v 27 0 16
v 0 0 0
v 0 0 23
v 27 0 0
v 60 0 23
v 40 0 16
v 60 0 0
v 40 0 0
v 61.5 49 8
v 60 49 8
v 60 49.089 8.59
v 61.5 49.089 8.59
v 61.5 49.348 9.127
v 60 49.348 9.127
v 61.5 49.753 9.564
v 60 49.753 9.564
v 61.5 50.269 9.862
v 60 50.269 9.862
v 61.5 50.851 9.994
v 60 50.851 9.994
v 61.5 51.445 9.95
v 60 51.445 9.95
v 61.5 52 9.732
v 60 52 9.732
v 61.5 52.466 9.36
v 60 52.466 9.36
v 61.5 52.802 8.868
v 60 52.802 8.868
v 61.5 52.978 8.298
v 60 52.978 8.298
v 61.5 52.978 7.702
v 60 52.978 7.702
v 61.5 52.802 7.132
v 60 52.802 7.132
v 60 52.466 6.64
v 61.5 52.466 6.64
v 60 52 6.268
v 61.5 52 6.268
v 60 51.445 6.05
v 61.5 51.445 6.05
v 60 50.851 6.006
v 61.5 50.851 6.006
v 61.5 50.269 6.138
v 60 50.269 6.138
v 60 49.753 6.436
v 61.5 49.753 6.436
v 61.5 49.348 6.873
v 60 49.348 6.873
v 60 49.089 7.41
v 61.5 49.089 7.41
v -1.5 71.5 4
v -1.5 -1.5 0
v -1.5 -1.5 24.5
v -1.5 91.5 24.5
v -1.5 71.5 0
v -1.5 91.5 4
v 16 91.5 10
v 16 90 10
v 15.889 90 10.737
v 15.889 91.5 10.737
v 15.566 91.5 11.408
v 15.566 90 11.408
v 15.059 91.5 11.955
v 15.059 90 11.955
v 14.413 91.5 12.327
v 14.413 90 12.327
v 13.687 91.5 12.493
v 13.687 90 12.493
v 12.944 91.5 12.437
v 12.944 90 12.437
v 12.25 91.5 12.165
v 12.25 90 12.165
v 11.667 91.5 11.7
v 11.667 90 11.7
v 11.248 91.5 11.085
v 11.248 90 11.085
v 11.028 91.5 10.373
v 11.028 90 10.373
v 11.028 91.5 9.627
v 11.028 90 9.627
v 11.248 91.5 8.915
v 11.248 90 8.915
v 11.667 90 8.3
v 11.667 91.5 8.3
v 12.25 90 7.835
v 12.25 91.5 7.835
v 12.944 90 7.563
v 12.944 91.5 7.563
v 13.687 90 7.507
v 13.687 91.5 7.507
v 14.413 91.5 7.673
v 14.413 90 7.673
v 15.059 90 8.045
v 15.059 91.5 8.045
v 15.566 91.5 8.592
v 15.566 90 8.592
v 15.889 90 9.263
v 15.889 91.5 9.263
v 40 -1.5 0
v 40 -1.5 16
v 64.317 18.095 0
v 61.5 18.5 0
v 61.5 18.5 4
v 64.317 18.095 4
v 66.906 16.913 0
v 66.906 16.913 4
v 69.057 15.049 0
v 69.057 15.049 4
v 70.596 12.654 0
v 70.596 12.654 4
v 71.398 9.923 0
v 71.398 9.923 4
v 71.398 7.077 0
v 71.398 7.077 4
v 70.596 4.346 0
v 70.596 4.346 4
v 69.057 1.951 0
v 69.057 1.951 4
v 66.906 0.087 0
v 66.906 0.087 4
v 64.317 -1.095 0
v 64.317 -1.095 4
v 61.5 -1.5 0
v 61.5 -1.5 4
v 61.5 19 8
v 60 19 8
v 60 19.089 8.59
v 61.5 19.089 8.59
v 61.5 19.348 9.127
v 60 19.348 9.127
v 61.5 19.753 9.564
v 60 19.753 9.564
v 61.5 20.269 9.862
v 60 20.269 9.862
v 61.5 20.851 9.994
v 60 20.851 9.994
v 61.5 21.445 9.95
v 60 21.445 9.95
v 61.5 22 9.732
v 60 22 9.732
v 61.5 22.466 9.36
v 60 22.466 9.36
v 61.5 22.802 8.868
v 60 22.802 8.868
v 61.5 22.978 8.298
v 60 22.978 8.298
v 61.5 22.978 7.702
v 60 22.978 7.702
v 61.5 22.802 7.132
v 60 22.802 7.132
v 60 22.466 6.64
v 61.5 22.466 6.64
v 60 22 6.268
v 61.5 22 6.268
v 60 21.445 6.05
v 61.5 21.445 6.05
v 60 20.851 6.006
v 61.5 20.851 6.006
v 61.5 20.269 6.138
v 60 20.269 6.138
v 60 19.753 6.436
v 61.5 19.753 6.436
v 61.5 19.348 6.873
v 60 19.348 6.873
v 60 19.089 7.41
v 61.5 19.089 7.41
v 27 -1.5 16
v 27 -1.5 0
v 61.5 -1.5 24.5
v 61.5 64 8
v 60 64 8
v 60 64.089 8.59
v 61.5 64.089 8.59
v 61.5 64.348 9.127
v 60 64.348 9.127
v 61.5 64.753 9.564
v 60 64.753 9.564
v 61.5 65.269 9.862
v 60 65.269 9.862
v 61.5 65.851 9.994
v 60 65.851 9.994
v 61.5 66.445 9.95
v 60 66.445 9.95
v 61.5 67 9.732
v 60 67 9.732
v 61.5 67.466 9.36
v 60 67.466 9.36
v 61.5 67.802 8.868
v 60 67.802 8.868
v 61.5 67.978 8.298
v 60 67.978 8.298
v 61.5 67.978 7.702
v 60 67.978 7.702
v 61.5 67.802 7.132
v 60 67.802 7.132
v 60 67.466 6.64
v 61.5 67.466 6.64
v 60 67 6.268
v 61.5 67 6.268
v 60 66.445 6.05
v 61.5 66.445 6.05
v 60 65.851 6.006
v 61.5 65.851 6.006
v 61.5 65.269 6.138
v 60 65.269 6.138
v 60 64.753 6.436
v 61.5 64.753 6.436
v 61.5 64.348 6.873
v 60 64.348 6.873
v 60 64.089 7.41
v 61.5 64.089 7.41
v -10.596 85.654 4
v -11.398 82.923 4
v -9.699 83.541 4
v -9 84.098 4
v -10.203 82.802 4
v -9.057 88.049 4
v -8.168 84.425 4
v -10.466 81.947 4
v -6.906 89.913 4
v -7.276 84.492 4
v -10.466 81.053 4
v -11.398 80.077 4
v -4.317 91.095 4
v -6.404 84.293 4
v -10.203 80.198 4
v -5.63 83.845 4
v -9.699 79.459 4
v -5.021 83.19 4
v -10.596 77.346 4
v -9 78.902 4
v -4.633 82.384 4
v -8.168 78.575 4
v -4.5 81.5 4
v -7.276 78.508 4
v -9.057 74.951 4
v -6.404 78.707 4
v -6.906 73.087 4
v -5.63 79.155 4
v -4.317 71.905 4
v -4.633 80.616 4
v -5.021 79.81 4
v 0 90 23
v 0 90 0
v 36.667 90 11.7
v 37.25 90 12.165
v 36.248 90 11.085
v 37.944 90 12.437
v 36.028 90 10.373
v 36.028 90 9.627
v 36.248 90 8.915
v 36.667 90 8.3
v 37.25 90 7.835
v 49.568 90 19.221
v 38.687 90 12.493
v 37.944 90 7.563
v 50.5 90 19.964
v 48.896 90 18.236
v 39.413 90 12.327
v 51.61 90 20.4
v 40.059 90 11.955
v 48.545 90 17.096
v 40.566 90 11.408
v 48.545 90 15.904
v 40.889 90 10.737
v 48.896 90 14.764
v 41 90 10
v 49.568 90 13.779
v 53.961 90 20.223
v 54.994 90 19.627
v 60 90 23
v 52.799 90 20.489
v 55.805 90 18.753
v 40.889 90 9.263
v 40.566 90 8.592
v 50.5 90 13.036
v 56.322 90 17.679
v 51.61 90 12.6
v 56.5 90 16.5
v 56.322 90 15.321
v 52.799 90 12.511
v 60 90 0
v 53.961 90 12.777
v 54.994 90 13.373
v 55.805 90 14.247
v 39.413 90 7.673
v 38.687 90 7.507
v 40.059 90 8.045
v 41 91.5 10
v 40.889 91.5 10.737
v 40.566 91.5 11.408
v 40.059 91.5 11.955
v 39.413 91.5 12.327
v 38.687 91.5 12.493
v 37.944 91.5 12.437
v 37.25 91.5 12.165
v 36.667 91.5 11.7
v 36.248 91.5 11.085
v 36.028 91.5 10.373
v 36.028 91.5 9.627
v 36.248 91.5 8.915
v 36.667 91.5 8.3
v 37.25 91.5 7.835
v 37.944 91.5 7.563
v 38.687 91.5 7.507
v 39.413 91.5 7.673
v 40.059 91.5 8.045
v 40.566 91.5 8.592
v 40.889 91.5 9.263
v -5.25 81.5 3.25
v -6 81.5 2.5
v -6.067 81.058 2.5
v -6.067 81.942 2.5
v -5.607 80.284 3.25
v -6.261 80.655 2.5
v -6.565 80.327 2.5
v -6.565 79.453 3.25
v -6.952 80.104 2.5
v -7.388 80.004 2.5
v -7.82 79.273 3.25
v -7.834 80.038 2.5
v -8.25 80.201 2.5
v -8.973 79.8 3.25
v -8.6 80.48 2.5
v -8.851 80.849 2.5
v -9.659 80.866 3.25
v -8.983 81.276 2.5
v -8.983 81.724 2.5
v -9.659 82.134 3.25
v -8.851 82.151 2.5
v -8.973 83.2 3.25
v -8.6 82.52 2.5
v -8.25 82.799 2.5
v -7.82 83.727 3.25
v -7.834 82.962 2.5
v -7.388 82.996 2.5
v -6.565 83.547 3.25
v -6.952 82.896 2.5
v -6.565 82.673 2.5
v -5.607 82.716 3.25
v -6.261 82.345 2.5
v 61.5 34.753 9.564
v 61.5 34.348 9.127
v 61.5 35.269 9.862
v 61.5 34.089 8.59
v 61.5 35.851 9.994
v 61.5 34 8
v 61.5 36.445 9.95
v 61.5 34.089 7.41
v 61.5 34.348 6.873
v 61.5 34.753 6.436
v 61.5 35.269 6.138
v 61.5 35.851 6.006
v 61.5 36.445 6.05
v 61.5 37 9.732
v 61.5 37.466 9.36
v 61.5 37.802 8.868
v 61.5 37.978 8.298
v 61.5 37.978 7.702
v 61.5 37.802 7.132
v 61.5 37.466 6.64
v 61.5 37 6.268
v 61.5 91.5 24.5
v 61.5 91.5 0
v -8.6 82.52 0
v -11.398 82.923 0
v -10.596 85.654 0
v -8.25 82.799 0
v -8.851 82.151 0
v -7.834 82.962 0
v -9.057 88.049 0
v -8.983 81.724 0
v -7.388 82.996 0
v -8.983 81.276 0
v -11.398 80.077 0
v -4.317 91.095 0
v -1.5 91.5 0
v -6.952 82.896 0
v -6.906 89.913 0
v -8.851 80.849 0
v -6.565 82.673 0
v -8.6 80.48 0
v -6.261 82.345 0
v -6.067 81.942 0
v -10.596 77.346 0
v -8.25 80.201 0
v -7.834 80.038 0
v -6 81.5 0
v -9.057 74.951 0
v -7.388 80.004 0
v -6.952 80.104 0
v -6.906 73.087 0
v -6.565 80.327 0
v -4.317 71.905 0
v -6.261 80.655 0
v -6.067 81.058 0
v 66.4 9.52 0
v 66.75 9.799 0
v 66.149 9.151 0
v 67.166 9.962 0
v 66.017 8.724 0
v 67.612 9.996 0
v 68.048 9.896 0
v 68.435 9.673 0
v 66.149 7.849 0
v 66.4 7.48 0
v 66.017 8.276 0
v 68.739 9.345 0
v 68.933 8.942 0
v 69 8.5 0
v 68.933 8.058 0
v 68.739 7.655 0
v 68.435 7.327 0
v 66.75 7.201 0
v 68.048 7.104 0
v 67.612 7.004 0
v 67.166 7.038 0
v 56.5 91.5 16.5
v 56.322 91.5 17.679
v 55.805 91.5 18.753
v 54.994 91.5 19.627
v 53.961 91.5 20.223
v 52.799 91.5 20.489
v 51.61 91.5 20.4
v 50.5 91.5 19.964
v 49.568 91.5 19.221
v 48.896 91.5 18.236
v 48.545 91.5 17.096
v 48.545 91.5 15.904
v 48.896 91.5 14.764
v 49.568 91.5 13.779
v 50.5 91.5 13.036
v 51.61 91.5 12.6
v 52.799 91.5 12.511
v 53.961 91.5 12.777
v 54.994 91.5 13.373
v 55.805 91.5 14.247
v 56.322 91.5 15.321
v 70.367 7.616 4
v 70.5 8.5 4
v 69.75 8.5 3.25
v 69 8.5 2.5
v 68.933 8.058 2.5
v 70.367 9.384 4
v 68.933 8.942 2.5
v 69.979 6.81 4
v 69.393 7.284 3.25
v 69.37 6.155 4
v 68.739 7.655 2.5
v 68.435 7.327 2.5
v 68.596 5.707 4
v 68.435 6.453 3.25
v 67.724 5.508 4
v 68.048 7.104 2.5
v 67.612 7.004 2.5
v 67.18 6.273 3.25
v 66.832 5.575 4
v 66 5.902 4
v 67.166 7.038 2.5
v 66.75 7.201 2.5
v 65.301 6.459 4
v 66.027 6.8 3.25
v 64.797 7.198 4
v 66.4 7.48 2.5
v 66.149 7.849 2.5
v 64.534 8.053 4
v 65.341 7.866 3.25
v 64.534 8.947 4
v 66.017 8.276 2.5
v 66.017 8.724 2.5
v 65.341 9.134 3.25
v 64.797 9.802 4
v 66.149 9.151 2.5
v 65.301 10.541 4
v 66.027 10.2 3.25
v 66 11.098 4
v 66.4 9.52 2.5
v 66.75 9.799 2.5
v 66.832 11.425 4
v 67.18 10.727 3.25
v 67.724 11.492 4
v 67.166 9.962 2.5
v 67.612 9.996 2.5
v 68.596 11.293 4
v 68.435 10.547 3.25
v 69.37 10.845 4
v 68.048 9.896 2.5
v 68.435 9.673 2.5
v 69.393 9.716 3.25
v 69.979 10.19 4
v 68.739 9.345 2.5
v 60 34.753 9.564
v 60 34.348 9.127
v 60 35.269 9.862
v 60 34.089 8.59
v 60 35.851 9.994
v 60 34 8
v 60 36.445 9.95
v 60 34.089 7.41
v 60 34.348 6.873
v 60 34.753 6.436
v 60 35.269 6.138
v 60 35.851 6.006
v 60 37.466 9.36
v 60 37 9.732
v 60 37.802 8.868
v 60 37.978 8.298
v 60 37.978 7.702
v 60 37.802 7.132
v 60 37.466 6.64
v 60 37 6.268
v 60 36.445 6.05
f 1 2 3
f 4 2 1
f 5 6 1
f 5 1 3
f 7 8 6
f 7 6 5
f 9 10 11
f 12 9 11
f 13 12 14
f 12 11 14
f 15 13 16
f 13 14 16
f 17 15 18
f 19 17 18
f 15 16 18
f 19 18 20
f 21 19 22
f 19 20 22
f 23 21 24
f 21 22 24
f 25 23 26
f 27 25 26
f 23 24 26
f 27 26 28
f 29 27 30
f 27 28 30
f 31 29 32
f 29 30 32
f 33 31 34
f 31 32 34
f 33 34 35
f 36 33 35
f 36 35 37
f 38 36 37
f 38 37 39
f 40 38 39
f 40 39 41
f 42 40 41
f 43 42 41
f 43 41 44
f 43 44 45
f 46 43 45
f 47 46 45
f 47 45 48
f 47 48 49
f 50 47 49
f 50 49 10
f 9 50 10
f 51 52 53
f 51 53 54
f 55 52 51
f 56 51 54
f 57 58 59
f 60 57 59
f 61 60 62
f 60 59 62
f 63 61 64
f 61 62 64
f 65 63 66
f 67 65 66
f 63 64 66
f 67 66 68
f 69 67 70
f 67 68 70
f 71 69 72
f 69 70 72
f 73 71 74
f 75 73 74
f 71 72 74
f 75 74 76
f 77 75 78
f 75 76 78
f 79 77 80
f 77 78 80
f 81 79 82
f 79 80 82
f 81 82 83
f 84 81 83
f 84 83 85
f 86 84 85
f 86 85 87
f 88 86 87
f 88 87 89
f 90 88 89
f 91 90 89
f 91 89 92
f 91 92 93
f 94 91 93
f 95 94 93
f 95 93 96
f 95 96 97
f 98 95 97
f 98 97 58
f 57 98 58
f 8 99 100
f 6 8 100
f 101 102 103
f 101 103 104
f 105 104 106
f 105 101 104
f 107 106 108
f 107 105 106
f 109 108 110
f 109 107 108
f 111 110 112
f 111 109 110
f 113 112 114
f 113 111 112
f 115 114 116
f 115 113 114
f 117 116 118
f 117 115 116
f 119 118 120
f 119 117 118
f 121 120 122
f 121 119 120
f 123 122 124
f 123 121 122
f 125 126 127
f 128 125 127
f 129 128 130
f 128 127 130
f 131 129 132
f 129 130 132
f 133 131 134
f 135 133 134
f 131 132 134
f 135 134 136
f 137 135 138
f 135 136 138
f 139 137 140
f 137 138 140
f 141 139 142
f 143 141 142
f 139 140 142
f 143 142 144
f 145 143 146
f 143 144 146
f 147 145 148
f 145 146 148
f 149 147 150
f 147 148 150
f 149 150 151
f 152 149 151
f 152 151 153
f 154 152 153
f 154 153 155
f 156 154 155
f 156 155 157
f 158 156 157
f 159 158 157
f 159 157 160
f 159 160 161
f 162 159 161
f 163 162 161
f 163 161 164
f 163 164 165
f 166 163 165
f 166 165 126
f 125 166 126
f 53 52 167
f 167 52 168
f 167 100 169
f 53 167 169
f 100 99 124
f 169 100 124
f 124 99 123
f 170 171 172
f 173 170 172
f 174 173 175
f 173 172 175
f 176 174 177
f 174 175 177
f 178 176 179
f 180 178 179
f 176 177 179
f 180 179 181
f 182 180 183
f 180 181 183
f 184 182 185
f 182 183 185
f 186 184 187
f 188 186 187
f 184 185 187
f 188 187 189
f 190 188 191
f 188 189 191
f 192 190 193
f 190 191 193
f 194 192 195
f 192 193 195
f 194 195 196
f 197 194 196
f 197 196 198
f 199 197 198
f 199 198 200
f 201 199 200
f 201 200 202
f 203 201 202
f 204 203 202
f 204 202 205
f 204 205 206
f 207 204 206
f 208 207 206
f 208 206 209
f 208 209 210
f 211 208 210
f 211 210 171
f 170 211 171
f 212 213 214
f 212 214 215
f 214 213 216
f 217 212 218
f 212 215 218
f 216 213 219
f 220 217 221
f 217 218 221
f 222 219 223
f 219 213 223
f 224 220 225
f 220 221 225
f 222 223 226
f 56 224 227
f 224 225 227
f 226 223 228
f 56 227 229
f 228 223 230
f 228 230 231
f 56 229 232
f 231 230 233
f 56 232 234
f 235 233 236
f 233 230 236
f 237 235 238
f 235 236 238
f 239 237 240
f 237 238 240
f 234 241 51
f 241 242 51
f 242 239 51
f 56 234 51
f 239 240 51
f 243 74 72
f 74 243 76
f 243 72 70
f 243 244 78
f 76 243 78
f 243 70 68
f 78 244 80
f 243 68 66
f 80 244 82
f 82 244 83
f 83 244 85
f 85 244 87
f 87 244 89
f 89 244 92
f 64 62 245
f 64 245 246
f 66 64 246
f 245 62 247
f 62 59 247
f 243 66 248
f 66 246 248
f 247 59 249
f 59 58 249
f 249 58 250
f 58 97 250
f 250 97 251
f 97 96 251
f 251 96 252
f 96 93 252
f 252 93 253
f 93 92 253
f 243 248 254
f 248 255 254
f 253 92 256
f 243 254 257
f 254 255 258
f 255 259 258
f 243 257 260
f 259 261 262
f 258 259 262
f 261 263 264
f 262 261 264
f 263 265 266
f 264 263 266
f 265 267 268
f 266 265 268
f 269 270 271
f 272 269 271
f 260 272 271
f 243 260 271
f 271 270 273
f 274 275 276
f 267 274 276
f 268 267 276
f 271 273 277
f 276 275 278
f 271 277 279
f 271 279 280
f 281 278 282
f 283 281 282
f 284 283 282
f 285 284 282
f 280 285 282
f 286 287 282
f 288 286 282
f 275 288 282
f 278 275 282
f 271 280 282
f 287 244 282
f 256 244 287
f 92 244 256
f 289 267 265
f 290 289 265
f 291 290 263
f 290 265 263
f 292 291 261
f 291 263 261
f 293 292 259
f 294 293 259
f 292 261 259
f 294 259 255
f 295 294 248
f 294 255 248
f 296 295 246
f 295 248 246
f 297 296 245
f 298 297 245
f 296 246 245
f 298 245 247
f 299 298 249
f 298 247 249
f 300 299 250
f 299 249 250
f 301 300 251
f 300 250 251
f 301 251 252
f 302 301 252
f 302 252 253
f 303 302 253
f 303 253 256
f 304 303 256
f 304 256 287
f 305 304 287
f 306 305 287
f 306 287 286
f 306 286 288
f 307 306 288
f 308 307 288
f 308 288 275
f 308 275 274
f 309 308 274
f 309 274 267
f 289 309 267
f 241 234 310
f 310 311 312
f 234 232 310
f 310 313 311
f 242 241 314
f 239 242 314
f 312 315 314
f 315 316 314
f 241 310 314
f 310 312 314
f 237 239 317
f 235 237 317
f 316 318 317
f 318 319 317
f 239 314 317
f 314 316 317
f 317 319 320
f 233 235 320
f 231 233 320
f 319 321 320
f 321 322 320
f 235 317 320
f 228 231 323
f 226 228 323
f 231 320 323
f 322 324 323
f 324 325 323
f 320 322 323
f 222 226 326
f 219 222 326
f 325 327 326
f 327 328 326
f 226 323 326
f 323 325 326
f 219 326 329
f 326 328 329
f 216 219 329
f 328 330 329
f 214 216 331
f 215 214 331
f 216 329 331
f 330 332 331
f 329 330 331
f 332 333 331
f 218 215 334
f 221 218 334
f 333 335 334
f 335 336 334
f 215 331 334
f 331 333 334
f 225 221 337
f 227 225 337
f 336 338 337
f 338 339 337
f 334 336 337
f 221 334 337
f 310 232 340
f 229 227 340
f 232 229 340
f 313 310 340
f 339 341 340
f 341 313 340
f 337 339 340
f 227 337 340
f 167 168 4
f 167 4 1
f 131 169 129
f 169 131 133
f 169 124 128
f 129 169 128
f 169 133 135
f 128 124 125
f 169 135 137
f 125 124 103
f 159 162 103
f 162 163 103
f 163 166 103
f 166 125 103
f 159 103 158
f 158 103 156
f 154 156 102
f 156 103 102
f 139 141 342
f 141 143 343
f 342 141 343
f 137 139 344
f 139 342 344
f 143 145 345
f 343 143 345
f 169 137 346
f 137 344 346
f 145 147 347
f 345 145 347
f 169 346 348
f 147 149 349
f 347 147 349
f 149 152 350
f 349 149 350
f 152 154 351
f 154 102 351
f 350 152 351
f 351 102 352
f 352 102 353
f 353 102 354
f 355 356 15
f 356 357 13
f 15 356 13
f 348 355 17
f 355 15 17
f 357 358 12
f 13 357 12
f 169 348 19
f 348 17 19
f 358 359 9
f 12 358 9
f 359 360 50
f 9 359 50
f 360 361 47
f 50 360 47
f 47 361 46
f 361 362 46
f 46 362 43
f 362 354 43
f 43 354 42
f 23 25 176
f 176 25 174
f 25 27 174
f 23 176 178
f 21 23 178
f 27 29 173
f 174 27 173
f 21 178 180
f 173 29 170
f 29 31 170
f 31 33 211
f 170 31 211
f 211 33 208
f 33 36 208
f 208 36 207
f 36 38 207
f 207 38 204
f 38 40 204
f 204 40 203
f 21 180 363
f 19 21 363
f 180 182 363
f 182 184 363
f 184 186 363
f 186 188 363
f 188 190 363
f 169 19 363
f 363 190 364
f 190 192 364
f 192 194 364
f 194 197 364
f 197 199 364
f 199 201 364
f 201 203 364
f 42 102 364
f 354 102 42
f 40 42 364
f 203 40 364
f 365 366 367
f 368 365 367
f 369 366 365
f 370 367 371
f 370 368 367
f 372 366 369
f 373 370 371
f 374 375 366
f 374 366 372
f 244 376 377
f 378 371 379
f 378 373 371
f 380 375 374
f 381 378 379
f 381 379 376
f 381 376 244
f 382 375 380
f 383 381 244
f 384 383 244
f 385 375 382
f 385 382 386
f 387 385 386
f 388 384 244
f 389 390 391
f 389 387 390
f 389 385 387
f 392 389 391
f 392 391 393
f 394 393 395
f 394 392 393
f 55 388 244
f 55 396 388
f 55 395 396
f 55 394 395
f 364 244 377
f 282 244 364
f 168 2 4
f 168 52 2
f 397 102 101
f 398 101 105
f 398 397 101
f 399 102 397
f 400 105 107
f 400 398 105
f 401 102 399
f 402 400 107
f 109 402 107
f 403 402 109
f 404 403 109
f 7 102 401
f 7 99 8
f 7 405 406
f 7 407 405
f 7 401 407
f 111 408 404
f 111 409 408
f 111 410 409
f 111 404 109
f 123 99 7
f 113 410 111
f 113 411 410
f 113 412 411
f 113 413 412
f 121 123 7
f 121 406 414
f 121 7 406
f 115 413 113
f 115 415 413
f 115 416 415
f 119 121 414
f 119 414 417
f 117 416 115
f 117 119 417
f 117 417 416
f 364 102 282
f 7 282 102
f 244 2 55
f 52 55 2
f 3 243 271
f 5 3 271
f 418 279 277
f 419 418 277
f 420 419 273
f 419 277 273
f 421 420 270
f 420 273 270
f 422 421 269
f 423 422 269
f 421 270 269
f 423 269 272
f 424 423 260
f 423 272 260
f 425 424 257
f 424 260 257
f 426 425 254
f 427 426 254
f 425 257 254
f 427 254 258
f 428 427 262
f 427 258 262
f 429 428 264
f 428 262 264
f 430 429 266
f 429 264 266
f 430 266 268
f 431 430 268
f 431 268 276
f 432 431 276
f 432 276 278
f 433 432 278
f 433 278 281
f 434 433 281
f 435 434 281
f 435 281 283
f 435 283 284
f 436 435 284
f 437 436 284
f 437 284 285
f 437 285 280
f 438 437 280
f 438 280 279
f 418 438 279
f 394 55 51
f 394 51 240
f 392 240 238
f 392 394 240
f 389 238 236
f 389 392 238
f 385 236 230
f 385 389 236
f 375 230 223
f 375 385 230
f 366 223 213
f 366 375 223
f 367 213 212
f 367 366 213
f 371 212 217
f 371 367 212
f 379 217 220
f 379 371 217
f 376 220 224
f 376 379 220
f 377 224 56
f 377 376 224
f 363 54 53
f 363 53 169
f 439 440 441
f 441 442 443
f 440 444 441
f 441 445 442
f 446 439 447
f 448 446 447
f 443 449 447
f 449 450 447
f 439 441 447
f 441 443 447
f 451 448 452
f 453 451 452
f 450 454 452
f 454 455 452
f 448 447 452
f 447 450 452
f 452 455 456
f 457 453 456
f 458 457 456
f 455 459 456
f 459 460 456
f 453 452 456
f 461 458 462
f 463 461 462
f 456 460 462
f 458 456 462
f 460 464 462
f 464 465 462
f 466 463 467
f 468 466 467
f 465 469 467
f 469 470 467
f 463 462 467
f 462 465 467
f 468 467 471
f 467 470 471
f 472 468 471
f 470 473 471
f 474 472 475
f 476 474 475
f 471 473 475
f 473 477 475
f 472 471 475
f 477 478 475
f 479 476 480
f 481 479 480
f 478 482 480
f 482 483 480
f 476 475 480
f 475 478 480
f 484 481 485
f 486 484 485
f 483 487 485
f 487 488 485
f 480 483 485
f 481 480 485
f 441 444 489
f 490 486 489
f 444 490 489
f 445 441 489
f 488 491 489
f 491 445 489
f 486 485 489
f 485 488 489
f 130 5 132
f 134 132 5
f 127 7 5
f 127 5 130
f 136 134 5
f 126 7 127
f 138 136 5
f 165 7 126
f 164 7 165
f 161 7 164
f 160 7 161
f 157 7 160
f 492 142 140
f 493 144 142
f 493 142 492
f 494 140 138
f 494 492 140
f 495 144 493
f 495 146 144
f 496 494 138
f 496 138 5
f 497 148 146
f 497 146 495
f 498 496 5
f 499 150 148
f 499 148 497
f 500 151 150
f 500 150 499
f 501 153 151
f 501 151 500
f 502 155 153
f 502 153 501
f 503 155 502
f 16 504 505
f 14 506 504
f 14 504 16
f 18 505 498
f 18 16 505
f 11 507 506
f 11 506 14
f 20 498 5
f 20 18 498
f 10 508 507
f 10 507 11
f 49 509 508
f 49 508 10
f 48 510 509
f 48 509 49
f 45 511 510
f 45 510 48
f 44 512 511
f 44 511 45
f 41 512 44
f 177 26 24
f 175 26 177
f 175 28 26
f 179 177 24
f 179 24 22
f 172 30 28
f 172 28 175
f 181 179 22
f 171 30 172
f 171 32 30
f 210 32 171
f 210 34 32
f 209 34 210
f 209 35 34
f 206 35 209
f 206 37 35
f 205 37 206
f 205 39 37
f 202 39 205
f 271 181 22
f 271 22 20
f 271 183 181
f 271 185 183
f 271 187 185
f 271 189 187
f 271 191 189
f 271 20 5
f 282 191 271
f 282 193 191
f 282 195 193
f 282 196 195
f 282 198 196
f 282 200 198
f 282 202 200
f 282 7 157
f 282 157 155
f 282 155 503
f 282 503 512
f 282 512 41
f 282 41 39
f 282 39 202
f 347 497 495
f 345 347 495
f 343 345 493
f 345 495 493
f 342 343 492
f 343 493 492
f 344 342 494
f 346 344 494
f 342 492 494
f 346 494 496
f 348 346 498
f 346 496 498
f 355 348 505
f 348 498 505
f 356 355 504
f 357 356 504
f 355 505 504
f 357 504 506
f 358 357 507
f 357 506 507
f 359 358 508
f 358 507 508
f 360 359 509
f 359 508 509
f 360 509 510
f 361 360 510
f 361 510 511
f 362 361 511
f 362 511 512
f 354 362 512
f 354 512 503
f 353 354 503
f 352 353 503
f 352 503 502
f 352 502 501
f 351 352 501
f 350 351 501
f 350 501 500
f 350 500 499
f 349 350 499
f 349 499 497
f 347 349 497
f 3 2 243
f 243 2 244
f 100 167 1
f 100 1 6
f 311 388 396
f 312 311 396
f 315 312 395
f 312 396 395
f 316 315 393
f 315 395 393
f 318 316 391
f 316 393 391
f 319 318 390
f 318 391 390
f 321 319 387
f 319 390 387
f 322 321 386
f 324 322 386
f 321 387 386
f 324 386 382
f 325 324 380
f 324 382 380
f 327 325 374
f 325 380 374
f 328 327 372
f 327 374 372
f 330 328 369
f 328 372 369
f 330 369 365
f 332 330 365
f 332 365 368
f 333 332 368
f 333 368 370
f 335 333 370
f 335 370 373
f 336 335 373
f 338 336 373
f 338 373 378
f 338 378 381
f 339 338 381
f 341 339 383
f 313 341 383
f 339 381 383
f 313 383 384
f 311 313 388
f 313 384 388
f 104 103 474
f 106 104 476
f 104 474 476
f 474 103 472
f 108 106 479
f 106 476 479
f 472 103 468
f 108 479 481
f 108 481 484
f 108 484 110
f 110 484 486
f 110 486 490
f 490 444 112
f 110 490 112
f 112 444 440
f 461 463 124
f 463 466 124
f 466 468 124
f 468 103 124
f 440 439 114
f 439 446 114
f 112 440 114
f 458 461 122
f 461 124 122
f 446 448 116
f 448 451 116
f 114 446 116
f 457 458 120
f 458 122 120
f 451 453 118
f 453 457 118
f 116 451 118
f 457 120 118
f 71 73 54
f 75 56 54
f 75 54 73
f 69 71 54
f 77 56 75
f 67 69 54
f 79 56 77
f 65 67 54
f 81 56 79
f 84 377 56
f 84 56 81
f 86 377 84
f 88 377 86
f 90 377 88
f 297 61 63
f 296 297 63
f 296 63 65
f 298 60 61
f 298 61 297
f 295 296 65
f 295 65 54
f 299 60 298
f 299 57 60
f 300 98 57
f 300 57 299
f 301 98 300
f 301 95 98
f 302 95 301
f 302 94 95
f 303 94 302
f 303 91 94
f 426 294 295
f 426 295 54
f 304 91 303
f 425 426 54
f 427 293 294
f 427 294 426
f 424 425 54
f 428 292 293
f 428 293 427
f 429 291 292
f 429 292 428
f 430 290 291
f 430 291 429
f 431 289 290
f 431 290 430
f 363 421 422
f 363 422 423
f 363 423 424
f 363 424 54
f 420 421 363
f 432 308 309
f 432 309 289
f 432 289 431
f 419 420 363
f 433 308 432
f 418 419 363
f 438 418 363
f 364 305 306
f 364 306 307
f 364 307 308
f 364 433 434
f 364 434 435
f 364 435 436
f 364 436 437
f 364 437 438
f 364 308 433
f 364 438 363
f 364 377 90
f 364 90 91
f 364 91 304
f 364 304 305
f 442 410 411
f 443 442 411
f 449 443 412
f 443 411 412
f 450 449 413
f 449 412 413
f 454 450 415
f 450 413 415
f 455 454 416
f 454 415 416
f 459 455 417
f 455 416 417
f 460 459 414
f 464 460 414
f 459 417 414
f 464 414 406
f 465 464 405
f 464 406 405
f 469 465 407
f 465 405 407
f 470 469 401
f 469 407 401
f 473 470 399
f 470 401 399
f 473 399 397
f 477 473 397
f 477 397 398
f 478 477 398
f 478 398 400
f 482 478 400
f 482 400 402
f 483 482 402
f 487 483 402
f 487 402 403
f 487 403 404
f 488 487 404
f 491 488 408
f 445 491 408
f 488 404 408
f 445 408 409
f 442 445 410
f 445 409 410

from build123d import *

# Parameters (mm, degrees)
F0_W      = 63
F0_H      = 93
F0_W_2    = 60
F0_H_2    = 90
F1_DEPTH  = 23
F2_W      = 13
F2_H      = 16
F3_DEPTH  = 25
F5_D      = 4
F5_DEPTH  = 12
F5_TIP    = 1.2017212381
F7_D      = 5
F7_DEPTH  = 12
F7_TIP    = 1.5021515476
F9_D      = 8
F9_DEPTH  = 12
F9_TIP    = 2.4034424761
F10_W     = 63
F10_H     = 93
F11_DEPTH = 1.5
F12_R     = 1.5
F13_DEPTH = 4
F14_SIZE  = 1.5


# Not quite as in the source:
# - a feature names something its author has since deleted; it is built from what else it names


with BuildPart() as f1:
    # F0 (on Top) → F1 (new body)
    with BuildSketch(Plane.XY):
        with Locations((30, 45)):
            Rectangle(F0_W, F0_H)
        with Locations((30, 45)):
            Rectangle(F0_W_2, F0_H_2, mode=Mode.SUBTRACT)
    extrude(amount=F1_DEPTH)

    # F2 (on face) → F3 (cut)
    with BuildSketch(Plane.XZ.offset(1.5)):
        with Locations((33.5, 8)):
            Rectangle(F2_W, F2_H)
    extrude(amount=-F3_DEPTH, mode=Mode.SUBTRACT)

    # F5
    with Locations(Plane.YZ.offset(61.5)):
        with Locations((51, 8), (66, 8), (36, 8), (21, 8)):
            Hole(F5_D / 2, depth=F5_DEPTH)
            with Locations((0, 0, -(F5_DEPTH + F5_TIP / 2))):  # 118° drill point
                Cone(0, F5_D / 2, F5_TIP, mode=Mode.SUBTRACT)

    # F7 (one way)
    with BuildSketch(Plane.XZ.offset(-90)):
        with Locations((13.5, 10), (38.5, 10)):
            Circle(F7_D / 2)
    extrude(amount=-F7_DEPTH, mode=Mode.SUBTRACT)
    with Locations(Plane.XZ.offset(-90)):
        with Locations((13.5, 10), (38.5, 10)):
            with Locations((0, 0, -(F7_DEPTH + F7_TIP / 2))):  # 118° drill point
                Cone(0, F7_D / 2, F7_TIP, mode=Mode.SUBTRACT)

    # F9
    with Locations(Plane(origin=(0, 91.5, 0), x_dir=(-1, 0, 0), z_dir=(0, 1, 0))):
        with Locations((-52.5, 16.5)):
            Hole(F9_D / 2, depth=F9_DEPTH)
            with Locations((0, 0, -(F9_DEPTH + F9_TIP / 2))):  # 118° drill point
                Cone(0, F9_D / 2, F9_TIP, mode=Mode.SUBTRACT)

    # F10 (on face) → F11 (join)
    with BuildSketch(Plane.XY.offset(23)):
        with Locations((30, 45)):
            Rectangle(F10_W, F10_H)
    extrude(amount=F11_DEPTH)

    # F12 (on face) → F13 (join)
    with BuildSketch(Plane(origin=(0, 0, 0), x_dir=(1, 0, 0), z_dir=(0, 0, -1))):
        with BuildLine():
            ThreePointArc((-1.5, -71.5), (-11.5, -81.5), (-1.5, -91.5))
            Line((-1.5, -91.5), (-1.5, -71.5))
        make_face()
        with Locations((-7.5, -81.5)):
            Circle(F12_R, mode=Mode.SUBTRACT)
        with BuildLine():
            Line((61.5, 1.5), (61.5, -18.5))
            ThreePointArc((61.5, -18.5), (71.5, -8.5), (61.5, 1.5))
        make_face()
        with Locations((67.5, -8.5)):
            Circle(F12_R, mode=Mode.SUBTRACT)
    extrude(amount=-F13_DEPTH)

    # F14
    f14_edges = [f1.edges().sort_by_distance(p)[0] for p in [
        (-9, 81.5, 4),
        (66, 8.5, 4),
    ]]
    chamfer(f14_edges, length=F14_SIZE)


solid = f1.part
